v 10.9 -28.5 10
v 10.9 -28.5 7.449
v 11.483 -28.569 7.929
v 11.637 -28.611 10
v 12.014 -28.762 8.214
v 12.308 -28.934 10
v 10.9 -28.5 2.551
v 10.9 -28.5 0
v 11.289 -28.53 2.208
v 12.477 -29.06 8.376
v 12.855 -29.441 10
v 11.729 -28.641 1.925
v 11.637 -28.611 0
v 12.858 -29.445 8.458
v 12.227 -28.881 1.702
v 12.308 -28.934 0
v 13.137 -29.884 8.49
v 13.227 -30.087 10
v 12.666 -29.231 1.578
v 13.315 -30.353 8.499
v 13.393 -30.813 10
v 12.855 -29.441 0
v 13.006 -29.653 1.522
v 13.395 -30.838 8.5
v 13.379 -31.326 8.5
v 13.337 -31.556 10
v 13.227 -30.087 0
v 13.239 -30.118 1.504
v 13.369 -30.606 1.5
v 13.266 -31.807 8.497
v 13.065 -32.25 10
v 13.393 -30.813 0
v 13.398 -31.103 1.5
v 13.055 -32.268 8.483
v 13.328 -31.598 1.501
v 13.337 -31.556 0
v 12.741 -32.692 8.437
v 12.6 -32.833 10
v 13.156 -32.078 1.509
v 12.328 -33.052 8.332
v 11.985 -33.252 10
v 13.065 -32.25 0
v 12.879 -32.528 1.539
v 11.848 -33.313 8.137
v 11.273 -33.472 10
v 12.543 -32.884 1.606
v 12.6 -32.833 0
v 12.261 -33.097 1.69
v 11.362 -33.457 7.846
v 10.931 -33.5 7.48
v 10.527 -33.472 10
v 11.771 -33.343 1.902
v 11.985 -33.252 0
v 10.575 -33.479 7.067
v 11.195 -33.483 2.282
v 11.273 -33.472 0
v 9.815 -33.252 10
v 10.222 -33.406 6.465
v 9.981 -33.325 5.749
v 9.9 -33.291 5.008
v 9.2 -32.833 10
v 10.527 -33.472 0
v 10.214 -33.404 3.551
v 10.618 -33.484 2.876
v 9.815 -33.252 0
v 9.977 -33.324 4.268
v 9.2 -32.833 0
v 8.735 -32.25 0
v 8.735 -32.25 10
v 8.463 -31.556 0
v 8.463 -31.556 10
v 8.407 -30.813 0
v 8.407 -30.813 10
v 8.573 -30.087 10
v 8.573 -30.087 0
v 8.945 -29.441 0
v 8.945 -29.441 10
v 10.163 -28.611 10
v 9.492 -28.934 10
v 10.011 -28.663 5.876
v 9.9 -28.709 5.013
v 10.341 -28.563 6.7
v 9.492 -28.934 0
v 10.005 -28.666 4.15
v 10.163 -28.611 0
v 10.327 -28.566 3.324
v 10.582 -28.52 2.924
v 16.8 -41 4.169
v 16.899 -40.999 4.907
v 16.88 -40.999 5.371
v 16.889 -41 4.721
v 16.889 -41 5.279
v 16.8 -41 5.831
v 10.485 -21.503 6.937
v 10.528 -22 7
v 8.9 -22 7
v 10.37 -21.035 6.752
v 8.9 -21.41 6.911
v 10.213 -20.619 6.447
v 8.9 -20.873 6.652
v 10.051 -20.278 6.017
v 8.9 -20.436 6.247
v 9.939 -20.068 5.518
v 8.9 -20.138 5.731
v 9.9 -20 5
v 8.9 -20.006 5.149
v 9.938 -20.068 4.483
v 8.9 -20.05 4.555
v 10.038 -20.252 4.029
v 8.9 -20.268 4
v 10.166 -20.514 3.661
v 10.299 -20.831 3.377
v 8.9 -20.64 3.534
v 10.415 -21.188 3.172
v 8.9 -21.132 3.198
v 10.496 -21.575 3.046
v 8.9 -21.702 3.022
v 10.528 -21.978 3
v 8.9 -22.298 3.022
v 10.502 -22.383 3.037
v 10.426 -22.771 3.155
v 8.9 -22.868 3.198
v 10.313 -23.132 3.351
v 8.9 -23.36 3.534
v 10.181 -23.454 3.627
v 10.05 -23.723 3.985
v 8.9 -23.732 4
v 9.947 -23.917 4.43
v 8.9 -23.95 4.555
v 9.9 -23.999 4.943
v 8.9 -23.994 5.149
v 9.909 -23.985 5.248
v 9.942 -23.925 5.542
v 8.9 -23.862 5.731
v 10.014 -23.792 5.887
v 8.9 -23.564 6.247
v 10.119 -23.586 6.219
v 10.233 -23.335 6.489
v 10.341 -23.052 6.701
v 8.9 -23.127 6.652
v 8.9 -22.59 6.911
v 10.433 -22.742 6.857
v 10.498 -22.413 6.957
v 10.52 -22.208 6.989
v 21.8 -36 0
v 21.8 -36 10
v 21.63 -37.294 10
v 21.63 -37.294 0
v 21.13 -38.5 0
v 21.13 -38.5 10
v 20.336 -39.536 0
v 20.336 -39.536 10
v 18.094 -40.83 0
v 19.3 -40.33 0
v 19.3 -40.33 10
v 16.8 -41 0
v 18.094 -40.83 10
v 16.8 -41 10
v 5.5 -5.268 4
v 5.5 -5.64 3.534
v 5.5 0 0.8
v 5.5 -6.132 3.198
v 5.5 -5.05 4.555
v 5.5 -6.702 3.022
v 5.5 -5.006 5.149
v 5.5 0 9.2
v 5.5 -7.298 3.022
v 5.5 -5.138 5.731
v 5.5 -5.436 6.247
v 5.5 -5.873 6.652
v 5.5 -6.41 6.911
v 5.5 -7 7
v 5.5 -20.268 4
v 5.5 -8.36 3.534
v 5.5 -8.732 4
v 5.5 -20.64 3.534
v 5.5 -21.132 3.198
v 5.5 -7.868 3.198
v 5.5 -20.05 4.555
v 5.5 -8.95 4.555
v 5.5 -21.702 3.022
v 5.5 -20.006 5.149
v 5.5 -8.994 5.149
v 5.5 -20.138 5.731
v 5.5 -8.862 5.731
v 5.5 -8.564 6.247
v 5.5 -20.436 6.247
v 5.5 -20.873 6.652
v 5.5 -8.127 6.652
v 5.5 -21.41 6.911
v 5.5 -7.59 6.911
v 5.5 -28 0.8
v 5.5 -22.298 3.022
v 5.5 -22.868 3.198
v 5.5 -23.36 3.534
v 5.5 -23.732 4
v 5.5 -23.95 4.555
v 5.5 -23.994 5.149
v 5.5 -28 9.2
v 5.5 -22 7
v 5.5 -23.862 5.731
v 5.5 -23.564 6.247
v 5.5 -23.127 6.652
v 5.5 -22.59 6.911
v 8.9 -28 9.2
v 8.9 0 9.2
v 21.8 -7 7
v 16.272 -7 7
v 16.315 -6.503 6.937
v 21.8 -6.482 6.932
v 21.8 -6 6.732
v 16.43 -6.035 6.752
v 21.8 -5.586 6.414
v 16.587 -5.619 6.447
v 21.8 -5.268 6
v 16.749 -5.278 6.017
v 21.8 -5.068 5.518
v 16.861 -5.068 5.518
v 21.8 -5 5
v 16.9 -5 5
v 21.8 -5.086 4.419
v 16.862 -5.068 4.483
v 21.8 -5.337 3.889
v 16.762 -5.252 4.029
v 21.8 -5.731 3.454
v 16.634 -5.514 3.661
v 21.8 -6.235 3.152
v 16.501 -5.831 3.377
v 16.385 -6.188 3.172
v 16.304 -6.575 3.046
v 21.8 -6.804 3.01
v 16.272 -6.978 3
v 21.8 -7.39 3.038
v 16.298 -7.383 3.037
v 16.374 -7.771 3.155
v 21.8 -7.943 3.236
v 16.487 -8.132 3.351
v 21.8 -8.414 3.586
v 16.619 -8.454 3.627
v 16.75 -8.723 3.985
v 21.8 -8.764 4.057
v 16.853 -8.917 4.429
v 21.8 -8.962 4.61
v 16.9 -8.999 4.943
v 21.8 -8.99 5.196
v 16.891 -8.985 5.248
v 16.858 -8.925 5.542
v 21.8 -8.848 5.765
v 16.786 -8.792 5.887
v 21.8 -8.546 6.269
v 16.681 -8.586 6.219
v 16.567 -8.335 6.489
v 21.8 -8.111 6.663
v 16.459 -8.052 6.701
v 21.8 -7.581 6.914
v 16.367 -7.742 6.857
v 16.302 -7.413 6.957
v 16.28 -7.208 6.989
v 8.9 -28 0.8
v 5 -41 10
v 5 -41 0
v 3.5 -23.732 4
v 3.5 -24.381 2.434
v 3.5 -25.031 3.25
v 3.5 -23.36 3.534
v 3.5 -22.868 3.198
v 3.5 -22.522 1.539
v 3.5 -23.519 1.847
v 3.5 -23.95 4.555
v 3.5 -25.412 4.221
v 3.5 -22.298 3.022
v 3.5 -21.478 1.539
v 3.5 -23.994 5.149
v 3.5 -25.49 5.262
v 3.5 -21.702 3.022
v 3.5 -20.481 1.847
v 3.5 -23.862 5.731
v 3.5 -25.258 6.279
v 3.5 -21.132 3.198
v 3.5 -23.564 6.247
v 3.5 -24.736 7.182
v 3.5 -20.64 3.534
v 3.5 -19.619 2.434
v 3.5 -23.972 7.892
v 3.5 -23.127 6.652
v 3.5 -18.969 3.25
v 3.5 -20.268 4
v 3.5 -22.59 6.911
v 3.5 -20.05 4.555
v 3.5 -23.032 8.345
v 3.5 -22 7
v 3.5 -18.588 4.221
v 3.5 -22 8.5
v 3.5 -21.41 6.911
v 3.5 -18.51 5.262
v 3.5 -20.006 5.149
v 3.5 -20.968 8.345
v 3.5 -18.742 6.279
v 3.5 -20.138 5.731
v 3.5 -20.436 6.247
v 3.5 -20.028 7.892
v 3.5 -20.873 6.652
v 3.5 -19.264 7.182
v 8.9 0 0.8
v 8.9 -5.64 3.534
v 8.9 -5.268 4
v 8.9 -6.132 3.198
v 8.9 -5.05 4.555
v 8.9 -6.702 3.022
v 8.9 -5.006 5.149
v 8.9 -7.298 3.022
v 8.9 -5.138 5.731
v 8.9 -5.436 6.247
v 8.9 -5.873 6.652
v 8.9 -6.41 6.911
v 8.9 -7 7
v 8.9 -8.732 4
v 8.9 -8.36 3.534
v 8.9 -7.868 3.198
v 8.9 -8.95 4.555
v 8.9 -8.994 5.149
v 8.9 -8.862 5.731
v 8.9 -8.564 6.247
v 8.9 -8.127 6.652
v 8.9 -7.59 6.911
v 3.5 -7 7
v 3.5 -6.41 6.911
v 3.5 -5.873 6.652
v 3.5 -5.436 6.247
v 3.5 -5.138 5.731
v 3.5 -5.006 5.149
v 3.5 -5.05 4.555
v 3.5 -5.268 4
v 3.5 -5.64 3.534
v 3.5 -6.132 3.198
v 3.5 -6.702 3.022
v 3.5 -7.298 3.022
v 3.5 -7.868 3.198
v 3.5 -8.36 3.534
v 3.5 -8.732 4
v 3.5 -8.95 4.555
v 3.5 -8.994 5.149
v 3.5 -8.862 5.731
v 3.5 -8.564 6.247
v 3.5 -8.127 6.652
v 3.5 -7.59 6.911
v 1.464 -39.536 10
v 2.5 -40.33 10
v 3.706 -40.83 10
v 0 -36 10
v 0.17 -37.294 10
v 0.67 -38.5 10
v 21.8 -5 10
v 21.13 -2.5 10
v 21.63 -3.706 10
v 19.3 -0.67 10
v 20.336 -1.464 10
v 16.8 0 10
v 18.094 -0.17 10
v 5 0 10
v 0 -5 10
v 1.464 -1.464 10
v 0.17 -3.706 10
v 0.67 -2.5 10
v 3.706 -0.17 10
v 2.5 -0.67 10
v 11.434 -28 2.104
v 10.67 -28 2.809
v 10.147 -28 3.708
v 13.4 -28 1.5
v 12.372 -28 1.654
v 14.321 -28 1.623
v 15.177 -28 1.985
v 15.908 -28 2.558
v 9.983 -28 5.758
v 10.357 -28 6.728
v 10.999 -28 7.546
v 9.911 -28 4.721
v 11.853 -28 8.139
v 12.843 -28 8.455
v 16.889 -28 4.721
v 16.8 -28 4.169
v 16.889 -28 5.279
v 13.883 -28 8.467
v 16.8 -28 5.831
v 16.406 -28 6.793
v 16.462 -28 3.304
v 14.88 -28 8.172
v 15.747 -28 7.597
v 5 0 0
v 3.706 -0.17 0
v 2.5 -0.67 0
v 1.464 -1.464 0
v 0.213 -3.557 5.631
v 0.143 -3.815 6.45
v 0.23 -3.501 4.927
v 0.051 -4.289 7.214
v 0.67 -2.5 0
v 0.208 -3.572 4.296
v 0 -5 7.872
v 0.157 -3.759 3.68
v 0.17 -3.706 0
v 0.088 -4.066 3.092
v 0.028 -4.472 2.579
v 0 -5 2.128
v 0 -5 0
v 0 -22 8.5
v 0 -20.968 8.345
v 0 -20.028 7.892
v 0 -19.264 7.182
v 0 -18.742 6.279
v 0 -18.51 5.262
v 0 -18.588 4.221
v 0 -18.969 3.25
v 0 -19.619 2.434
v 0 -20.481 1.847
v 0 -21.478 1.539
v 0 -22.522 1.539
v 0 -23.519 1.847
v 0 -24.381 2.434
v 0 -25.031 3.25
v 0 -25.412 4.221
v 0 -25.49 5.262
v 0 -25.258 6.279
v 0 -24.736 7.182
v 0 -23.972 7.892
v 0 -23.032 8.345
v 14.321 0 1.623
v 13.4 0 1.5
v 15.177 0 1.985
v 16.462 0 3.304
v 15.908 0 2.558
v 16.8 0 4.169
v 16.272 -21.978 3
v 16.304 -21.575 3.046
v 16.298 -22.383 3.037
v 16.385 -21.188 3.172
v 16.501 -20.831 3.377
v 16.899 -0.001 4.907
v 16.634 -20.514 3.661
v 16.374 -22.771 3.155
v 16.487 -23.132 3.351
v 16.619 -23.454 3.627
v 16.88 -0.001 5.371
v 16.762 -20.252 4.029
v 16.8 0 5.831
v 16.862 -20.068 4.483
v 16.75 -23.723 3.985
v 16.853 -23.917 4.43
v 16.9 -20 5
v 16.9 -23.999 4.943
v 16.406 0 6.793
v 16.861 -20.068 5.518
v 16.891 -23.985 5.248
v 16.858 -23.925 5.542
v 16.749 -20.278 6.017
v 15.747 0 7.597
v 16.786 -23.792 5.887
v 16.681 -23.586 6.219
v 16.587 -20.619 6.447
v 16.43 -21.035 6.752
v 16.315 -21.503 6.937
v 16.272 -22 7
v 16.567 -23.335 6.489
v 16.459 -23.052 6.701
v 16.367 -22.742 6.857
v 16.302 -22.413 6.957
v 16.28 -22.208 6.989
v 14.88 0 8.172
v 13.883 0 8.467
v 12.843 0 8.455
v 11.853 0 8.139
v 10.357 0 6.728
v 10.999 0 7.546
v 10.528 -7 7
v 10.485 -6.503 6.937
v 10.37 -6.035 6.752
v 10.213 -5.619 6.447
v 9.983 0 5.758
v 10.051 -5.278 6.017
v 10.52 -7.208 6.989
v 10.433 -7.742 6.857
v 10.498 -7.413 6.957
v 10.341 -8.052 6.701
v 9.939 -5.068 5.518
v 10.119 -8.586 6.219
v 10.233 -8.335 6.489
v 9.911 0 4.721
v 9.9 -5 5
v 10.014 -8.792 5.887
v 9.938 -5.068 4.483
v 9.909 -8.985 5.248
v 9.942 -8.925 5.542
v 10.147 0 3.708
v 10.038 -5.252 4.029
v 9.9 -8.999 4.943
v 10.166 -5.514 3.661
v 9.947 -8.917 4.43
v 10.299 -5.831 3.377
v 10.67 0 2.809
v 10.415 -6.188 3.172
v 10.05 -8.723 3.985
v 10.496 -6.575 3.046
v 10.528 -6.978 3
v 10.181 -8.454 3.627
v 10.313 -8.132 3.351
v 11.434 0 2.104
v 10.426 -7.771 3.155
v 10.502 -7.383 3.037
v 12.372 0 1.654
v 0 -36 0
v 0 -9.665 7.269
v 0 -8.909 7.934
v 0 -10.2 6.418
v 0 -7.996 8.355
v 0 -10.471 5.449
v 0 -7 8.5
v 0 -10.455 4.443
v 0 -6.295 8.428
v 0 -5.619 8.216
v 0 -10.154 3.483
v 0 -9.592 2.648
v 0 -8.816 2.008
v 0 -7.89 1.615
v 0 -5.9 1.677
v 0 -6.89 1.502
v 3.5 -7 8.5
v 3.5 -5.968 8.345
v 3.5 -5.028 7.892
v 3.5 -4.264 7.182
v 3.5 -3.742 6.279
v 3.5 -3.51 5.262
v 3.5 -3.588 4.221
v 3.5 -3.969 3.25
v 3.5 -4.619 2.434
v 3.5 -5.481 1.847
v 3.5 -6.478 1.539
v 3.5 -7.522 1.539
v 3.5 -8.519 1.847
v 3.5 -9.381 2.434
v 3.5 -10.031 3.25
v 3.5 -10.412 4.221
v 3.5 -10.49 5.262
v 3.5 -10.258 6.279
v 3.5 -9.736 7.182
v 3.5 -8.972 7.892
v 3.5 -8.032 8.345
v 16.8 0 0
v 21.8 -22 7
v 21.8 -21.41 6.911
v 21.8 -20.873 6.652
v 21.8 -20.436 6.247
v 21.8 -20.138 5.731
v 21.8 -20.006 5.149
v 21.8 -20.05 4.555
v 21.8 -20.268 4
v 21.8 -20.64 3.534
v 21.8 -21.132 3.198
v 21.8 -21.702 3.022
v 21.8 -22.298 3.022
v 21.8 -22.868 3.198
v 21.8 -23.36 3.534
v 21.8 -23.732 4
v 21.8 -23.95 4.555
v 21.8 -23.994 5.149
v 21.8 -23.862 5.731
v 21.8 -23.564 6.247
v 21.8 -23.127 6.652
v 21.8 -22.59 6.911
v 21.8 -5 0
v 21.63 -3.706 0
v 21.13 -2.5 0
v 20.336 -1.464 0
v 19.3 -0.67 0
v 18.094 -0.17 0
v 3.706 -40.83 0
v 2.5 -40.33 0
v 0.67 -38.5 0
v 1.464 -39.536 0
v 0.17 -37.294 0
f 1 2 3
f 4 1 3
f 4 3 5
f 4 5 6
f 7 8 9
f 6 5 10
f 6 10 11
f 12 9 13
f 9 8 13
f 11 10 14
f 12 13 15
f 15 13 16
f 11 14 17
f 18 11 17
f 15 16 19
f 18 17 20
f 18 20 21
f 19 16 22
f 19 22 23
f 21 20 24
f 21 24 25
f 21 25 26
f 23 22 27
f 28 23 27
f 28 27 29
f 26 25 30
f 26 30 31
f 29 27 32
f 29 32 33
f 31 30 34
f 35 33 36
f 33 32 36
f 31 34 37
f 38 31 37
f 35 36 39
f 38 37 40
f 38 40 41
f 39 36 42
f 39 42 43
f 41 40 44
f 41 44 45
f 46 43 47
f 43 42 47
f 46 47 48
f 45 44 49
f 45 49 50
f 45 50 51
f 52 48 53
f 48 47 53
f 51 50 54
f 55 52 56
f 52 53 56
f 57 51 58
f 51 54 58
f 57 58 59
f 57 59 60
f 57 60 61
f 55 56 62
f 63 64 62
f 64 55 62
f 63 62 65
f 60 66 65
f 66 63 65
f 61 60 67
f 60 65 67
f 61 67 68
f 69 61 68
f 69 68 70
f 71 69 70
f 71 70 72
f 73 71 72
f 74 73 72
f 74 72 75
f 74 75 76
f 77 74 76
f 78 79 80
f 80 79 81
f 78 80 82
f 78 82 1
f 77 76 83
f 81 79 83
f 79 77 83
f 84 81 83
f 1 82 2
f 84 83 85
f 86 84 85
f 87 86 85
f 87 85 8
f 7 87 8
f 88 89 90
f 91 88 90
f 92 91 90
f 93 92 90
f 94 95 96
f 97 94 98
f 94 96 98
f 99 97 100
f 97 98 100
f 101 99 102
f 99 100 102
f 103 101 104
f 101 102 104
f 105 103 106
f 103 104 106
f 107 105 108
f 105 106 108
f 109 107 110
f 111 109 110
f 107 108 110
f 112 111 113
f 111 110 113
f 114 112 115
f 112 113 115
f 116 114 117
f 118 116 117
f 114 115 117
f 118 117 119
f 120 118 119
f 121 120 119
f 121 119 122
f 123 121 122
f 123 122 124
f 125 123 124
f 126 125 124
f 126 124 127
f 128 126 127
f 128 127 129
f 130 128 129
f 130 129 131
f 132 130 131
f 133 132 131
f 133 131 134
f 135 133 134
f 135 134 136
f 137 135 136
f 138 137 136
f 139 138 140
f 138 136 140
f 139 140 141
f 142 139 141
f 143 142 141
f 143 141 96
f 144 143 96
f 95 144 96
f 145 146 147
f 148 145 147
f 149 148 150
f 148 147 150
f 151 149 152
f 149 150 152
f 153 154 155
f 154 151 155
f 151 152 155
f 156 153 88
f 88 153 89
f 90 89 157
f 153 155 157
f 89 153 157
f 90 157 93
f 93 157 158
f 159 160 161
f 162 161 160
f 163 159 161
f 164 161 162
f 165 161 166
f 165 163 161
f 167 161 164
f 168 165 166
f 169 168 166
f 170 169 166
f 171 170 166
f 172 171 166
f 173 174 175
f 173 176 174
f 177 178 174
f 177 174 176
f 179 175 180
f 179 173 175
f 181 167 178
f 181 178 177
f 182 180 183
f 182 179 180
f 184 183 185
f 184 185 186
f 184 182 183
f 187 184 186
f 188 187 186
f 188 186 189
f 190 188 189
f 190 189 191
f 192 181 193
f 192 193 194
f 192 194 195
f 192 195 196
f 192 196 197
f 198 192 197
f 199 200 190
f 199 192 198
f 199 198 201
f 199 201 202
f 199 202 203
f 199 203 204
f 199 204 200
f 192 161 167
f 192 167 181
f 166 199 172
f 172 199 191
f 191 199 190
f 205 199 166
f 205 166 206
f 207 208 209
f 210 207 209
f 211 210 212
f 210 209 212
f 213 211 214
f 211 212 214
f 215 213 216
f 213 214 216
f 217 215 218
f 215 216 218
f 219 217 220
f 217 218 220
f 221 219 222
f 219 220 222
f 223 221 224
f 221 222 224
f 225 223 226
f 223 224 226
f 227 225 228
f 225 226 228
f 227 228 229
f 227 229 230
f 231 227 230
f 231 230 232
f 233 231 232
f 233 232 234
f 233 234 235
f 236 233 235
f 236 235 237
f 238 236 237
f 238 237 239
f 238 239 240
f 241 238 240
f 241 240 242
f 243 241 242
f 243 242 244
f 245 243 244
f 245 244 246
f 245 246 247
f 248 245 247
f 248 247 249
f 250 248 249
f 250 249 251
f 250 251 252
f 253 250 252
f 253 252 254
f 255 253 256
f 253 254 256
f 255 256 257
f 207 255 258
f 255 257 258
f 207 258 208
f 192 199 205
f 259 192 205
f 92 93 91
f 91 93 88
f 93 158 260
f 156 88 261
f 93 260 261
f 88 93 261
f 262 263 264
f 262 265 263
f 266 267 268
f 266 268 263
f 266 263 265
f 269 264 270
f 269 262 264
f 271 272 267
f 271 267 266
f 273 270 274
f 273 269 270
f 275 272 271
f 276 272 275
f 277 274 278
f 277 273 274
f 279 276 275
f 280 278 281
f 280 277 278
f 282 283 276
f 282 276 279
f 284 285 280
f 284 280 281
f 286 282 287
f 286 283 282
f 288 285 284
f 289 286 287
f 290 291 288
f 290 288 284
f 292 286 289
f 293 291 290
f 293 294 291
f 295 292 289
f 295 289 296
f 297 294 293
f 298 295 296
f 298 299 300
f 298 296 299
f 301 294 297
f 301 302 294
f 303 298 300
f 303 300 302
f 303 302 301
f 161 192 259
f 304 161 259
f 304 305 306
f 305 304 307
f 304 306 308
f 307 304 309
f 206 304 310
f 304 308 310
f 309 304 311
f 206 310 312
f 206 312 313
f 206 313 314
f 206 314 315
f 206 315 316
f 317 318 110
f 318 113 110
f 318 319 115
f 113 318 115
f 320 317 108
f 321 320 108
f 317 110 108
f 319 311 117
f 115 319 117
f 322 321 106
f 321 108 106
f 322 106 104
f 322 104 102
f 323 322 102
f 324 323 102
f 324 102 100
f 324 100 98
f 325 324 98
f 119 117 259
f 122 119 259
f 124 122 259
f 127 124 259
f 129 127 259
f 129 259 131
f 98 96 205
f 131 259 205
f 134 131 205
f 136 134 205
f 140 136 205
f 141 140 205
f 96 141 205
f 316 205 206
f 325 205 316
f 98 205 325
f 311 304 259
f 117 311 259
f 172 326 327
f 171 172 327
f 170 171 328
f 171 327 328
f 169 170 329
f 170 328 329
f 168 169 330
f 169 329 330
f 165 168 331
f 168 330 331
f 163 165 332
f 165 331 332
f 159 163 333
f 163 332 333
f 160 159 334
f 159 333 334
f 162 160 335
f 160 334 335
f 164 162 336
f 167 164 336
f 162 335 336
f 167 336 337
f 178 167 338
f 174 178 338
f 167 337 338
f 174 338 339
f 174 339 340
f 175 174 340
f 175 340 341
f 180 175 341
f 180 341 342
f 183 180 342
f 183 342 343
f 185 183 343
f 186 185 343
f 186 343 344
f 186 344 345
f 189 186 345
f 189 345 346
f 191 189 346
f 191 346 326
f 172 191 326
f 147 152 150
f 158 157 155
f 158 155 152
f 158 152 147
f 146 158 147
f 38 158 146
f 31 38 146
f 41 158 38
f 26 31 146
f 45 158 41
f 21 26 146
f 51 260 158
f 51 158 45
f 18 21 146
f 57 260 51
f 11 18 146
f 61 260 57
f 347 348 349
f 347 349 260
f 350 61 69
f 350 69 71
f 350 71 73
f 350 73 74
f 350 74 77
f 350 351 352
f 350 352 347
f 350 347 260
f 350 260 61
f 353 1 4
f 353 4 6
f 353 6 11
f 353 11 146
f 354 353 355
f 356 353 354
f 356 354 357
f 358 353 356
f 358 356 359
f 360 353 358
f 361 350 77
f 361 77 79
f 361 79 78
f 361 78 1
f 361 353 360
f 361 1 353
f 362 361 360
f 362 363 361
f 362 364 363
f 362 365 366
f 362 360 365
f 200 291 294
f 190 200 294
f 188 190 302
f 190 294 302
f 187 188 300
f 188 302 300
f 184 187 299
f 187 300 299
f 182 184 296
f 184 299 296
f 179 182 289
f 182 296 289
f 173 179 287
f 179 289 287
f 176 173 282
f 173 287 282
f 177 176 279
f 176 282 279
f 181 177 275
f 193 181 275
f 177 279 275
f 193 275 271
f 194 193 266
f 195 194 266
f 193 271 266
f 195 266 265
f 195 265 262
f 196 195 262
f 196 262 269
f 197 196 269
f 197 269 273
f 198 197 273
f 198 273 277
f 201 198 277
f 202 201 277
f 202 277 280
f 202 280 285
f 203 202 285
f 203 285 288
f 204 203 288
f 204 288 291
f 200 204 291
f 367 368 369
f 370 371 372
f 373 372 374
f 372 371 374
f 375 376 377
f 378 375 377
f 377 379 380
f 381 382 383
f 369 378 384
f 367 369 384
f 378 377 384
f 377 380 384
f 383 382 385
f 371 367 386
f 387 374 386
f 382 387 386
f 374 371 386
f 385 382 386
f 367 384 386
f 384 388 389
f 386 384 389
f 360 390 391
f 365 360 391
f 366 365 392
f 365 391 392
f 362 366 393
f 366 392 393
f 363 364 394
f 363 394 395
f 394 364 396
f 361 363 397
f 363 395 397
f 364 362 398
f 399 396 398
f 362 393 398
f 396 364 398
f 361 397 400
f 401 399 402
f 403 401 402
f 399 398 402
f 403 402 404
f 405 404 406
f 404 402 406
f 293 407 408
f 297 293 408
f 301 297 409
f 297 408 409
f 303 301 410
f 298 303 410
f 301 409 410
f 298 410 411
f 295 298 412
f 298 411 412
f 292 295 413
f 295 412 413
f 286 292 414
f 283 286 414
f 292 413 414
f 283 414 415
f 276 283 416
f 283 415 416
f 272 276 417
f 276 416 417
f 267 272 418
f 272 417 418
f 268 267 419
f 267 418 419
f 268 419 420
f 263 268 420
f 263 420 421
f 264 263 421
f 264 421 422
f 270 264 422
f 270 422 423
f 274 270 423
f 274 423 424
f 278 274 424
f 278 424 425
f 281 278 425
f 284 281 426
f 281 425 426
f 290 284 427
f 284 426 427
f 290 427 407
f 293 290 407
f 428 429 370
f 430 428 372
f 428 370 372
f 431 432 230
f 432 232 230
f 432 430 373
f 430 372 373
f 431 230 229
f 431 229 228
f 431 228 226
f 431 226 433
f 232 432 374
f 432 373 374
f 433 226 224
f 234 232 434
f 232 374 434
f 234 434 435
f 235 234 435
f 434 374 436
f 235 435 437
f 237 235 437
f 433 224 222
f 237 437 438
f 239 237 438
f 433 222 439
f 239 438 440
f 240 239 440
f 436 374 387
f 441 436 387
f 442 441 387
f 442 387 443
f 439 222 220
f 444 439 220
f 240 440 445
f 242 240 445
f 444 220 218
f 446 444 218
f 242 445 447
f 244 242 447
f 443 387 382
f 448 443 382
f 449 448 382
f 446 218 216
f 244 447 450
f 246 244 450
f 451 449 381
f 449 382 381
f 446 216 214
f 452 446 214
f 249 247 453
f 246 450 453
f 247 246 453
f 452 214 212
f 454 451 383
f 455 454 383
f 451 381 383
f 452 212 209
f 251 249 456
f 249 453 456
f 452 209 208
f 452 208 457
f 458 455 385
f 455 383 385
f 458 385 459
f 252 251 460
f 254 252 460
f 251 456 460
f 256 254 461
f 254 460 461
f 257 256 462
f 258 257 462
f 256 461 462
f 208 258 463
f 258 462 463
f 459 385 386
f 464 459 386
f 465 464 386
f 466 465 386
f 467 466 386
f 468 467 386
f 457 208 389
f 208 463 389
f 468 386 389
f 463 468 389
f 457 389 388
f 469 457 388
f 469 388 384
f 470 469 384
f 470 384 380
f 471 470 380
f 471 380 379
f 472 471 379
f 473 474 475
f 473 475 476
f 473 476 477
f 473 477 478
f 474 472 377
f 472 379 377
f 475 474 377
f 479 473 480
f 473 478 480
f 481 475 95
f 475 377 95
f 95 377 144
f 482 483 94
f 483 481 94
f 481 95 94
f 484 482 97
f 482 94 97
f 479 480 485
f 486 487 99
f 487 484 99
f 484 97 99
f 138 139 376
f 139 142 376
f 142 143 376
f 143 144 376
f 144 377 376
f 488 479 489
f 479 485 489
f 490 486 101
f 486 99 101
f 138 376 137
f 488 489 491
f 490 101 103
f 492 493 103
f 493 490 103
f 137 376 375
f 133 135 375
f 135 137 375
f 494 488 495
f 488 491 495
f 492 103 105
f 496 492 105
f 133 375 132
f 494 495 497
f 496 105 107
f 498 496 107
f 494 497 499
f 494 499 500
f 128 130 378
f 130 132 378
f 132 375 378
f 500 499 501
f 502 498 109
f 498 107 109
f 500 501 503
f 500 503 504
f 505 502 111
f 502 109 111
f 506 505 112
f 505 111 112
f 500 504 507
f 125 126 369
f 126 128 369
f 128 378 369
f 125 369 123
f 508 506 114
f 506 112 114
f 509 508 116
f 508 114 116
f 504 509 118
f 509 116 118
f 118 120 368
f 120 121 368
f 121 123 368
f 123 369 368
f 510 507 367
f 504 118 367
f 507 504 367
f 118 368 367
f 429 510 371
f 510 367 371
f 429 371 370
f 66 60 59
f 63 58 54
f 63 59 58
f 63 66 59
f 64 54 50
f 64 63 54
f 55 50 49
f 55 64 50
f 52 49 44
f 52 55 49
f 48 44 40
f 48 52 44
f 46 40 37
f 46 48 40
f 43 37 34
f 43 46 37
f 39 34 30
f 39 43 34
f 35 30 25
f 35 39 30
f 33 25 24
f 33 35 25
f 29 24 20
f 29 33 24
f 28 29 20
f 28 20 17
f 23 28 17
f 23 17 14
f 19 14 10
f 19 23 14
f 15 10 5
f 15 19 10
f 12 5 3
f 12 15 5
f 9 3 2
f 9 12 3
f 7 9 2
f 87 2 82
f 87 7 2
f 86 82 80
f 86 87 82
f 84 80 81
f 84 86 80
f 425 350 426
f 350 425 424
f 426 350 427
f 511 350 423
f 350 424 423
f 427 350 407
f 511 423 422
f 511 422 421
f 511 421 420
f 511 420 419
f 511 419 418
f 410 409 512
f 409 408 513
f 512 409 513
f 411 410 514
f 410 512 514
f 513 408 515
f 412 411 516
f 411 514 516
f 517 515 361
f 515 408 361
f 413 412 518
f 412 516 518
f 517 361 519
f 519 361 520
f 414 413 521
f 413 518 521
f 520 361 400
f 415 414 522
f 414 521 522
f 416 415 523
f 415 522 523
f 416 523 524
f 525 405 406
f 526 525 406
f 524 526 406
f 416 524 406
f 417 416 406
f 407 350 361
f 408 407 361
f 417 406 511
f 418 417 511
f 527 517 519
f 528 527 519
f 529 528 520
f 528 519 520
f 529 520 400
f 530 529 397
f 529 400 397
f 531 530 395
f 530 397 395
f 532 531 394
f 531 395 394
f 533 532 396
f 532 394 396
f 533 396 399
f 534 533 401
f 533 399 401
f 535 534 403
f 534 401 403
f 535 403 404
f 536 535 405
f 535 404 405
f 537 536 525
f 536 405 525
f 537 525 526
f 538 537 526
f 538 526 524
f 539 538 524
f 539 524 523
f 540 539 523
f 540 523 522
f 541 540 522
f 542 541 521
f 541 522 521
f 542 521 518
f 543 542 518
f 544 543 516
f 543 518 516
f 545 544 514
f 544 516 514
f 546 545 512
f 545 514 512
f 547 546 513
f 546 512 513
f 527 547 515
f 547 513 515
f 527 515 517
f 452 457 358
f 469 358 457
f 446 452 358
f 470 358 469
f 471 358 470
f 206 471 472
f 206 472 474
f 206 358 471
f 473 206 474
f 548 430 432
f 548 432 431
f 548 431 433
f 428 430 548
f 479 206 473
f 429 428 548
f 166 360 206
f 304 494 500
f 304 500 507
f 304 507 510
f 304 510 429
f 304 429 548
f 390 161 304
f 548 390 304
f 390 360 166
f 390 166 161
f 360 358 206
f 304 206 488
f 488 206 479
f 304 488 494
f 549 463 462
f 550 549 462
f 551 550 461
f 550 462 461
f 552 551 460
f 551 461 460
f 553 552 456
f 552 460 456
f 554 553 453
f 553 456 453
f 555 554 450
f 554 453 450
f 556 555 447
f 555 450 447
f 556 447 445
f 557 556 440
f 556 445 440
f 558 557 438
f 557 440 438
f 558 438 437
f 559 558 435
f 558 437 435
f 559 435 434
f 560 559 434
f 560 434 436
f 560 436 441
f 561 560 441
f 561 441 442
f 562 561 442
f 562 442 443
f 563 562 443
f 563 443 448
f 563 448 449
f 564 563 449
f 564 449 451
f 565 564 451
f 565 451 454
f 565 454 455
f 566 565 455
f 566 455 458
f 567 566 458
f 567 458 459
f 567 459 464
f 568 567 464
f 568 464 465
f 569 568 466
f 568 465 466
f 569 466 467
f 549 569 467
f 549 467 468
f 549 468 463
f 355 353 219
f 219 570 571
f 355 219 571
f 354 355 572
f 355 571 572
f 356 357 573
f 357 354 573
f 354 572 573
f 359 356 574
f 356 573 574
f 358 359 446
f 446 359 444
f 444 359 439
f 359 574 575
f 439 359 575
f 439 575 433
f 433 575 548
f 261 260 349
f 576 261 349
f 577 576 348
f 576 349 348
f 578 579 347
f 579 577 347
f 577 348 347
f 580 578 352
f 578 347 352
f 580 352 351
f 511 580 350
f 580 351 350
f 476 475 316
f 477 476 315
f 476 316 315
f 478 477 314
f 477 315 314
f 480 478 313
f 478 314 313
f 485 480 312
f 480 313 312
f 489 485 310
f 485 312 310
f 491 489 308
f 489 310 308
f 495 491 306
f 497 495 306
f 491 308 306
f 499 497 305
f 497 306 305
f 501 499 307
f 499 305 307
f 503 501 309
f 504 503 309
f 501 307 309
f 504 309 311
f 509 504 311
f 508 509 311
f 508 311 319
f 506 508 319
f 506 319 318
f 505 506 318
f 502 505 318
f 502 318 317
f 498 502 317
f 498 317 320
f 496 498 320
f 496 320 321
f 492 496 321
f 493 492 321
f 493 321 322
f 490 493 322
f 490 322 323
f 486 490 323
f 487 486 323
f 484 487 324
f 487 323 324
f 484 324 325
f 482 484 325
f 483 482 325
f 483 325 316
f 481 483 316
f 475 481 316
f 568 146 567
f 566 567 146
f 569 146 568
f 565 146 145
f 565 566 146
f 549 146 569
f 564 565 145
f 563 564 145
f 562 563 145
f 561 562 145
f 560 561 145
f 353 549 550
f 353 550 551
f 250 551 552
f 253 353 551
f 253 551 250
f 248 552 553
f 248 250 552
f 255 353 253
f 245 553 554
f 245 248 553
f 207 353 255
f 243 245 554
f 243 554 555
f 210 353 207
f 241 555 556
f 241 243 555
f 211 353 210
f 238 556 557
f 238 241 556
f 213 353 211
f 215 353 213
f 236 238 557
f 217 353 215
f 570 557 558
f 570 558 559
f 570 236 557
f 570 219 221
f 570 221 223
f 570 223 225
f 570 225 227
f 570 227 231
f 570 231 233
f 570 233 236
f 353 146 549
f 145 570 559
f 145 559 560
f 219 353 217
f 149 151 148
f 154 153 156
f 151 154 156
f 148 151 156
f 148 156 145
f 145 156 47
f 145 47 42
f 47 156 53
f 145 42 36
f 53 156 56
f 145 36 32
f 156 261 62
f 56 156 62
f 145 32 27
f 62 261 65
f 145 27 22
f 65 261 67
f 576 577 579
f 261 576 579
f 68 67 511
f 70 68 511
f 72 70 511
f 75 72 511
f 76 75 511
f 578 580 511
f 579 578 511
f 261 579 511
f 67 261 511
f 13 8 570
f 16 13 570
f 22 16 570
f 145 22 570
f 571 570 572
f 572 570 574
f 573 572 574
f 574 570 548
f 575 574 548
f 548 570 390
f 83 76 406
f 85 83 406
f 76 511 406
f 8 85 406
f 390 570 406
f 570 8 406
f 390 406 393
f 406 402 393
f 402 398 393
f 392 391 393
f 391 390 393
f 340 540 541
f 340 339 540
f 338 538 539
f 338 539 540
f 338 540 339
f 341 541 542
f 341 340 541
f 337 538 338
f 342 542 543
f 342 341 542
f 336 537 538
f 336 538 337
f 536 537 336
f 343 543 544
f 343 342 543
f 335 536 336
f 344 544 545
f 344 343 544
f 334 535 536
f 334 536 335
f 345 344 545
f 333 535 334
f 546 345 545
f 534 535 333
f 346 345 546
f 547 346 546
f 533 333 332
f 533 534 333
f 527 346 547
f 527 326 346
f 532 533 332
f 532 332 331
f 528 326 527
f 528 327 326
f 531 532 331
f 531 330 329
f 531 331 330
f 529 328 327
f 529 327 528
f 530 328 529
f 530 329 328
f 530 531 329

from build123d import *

# Parameters (mm, degrees)
CROQUIS1_W              = 10
CROQUIS1_H              = 41
SALIENTE_EXTRUIR1_DEPTH = 21.8
CROQUIS6_R              = 2
CORTAR_EXTRUIR2_DEPTH   = 21.8
CORTAR_EXTRUIR4_REACH   = 49.5
CROQUIS11_R             = 3.5
CROQUIS11_W             = 3.4
CROQUIS11_H             = 8.4
CORTAR_EXTRUIR5_REACH   = 49.5
CROQUIS12_R             = 2.5
REDONDEO1_R             = 5
CROQUIS13_R             = 3.5
CORTAR_EXTRUIR6_DEPTH   = 3.5
CROQUIS15_W             = 3.4
CROQUIS15_H             = 8.4
SALIENTE_EXTRUIR2_DEPTH = 13
CORTAR_EXTRUIR7_START   = -10
CROQUIS16_R             = 2.5
CORTAR_EXTRUIR7_DEPTH   = 10


with BuildPart() as part:
    # Croquis1 → Saliente-Extruir1 (new body)
    with BuildSketch(Plane(origin=(0, 0, 0), x_dir=(0, 0, -1), z_dir=(1, 0, 0))):
        with Locations((-5, -20.5)):
            Rectangle(CROQUIS1_W, CROQUIS1_H)
    extrude(amount=SALIENTE_EXTRUIR1_DEPTH)

    # Croquis6 → Cortar-Extruir2 (cut)
    with BuildSketch(Plane.ZY):
        with Locations((5, -22)):
            Circle(CROQUIS6_R)
        with Locations((5, -7)):
            Circle(CROQUIS6_R)
    extrude(amount=-CORTAR_EXTRUIR2_DEPTH, mode=Mode.SUBTRACT)

    # Croquis11 → Cortar-Extruir4 (cut, up to next)
    with BuildSketch(Plane.XZ.offset(41), mode=Mode.PRIVATE) as cortar_extruir4_sk1:
        with Locations(Location((13.4, 5, 0), (0, 0, 270))):
            Circle(CROQUIS11_R)
    cortar_extruir4_tool1 = extrude(cortar_extruir4_sk1.sketch, amount=-CORTAR_EXTRUIR4_REACH, mode=Mode.PRIVATE) & part.part
    # Croquis11 → Cortar-Extruir4 (cut, up to next)
    with BuildSketch(Plane.XZ.offset(41), mode=Mode.PRIVATE) as cortar_extruir4_sk2:
        with Locations((7.2, 5)):
            Rectangle(CROQUIS11_W, CROQUIS11_H)
    cortar_extruir4_tool2 = extrude(cortar_extruir4_sk2.sketch, amount=-CORTAR_EXTRUIR4_REACH, mode=Mode.PRIVATE) & part.part
    add(cortar_extruir4_tool1.solids().sort_by_distance((13.4, -41, 5))[0], mode=Mode.SUBTRACT)
    add(cortar_extruir4_tool2.solids().sort_by_distance((7.2, -41, 5))[0], mode=Mode.SUBTRACT)

    # Cortar-Extruir5: up to this face of the body (flat: up to its plane)
    cortar_extruir5_end = Plane(part.part.faces().sort_by_distance((10.9, -20.5, 10))[0])
    # Croquis12 → Cortar-Extruir5 (cut, up to the picked face)
    with BuildSketch(Plane(origin=(0, 0, 0), x_dir=(-1, 0, 0), z_dir=(0, 0, -1)), mode=Mode.PRIVATE) as cortar_extruir5_sk1:
        with Locations(Location((-10.9, -31, 0), (0, 0, 90))):
            Circle(CROQUIS12_R)
    cortar_extruir5_tool1 = split(extrude(cortar_extruir5_sk1.sketch, amount=-CORTAR_EXTRUIR5_REACH, mode=Mode.PRIVATE), bisect_by=cortar_extruir5_end, keep=Keep.BOTH, mode=Mode.PRIVATE)
    add(cortar_extruir5_tool1.solids().sort_by(Axis((10.9, -31, 0), (0, 0, 1)))[0], mode=Mode.SUBTRACT)

    # Redondeo1
    # the kernel refuses this fillet: 5 mm, written as the material it takes off along each edge
    with BuildSketch(Plane(origin=(21.8, -41, 22.5), x_dir=(0, 1, 0), z_dir=(0, 0, -1)), Plane(origin=(0, 0, -12.5), x_dir=(1, 0, 0), z_dir=(0, 0, 1))) as redondeo1_piece_1:
        with BuildLine():
            CenterArc((REDONDEO1_R, -REDONDEO1_R), REDONDEO1_R, 90, 90)
            Line((0, -REDONDEO1_R), (0, 0))
            Line((0, 0), (REDONDEO1_R, 0))
        make_face()
    extrude(amount=35, mode=Mode.SUBTRACT)
    with BuildSketch(Plane(origin=(21.8, 0, -12.5), x_dir=(-1, 0, 0), z_dir=(0, 0, 1)), Plane(origin=(0, -41, 22.5), x_dir=(0, 1, 0), z_dir=(0, 0, -1))) as redondeo1_piece_2:
        with BuildLine():
            CenterArc((REDONDEO1_R, REDONDEO1_R), REDONDEO1_R, 180, 90)
            Line((0, REDONDEO1_R), (0, 0))
            Line((0, 0), (REDONDEO1_R, 0))
        make_face()
    extrude(amount=35, mode=Mode.SUBTRACT)

    # Croquis13 → Cortar-Extruir6 (cut)
    with BuildSketch(Plane.ZY):
        with Locations((5, -7)):
            Circle(CROQUIS13_R)
        with Locations((5, -22)):
            Circle(CROQUIS13_R)
    extrude(amount=-CORTAR_EXTRUIR6_DEPTH, mode=Mode.SUBTRACT)

    # Croquis15 → Saliente-Extruir2 (add)
    with BuildSketch(Plane.XZ.offset(41)):
        with Locations((7.2, 5)):
            Rectangle(CROQUIS15_W, CROQUIS15_H)
        with BuildLine():
            ThreePointArc((16.8, 4.169337614), (16.9, 5), (16.8, 5.830662386))
            ThreePointArc((16.8, 5.830662386), (9.9, 5), (16.8, 4.169337614))
        make_face()
    extrude(amount=-SALIENTE_EXTRUIR2_DEPTH)

    # Croquis16 → Cortar-Extruir7 (cut)
    with BuildSketch(Plane.XY.offset(10).offset(CORTAR_EXTRUIR7_START)):
        with Locations(Location((10.9, -31, 0), (0, 0, 90))):
            Circle(CROQUIS16_R)
    extrude(amount=CORTAR_EXTRUIR7_DEPTH, mode=Mode.SUBTRACT)


solid = part.part
